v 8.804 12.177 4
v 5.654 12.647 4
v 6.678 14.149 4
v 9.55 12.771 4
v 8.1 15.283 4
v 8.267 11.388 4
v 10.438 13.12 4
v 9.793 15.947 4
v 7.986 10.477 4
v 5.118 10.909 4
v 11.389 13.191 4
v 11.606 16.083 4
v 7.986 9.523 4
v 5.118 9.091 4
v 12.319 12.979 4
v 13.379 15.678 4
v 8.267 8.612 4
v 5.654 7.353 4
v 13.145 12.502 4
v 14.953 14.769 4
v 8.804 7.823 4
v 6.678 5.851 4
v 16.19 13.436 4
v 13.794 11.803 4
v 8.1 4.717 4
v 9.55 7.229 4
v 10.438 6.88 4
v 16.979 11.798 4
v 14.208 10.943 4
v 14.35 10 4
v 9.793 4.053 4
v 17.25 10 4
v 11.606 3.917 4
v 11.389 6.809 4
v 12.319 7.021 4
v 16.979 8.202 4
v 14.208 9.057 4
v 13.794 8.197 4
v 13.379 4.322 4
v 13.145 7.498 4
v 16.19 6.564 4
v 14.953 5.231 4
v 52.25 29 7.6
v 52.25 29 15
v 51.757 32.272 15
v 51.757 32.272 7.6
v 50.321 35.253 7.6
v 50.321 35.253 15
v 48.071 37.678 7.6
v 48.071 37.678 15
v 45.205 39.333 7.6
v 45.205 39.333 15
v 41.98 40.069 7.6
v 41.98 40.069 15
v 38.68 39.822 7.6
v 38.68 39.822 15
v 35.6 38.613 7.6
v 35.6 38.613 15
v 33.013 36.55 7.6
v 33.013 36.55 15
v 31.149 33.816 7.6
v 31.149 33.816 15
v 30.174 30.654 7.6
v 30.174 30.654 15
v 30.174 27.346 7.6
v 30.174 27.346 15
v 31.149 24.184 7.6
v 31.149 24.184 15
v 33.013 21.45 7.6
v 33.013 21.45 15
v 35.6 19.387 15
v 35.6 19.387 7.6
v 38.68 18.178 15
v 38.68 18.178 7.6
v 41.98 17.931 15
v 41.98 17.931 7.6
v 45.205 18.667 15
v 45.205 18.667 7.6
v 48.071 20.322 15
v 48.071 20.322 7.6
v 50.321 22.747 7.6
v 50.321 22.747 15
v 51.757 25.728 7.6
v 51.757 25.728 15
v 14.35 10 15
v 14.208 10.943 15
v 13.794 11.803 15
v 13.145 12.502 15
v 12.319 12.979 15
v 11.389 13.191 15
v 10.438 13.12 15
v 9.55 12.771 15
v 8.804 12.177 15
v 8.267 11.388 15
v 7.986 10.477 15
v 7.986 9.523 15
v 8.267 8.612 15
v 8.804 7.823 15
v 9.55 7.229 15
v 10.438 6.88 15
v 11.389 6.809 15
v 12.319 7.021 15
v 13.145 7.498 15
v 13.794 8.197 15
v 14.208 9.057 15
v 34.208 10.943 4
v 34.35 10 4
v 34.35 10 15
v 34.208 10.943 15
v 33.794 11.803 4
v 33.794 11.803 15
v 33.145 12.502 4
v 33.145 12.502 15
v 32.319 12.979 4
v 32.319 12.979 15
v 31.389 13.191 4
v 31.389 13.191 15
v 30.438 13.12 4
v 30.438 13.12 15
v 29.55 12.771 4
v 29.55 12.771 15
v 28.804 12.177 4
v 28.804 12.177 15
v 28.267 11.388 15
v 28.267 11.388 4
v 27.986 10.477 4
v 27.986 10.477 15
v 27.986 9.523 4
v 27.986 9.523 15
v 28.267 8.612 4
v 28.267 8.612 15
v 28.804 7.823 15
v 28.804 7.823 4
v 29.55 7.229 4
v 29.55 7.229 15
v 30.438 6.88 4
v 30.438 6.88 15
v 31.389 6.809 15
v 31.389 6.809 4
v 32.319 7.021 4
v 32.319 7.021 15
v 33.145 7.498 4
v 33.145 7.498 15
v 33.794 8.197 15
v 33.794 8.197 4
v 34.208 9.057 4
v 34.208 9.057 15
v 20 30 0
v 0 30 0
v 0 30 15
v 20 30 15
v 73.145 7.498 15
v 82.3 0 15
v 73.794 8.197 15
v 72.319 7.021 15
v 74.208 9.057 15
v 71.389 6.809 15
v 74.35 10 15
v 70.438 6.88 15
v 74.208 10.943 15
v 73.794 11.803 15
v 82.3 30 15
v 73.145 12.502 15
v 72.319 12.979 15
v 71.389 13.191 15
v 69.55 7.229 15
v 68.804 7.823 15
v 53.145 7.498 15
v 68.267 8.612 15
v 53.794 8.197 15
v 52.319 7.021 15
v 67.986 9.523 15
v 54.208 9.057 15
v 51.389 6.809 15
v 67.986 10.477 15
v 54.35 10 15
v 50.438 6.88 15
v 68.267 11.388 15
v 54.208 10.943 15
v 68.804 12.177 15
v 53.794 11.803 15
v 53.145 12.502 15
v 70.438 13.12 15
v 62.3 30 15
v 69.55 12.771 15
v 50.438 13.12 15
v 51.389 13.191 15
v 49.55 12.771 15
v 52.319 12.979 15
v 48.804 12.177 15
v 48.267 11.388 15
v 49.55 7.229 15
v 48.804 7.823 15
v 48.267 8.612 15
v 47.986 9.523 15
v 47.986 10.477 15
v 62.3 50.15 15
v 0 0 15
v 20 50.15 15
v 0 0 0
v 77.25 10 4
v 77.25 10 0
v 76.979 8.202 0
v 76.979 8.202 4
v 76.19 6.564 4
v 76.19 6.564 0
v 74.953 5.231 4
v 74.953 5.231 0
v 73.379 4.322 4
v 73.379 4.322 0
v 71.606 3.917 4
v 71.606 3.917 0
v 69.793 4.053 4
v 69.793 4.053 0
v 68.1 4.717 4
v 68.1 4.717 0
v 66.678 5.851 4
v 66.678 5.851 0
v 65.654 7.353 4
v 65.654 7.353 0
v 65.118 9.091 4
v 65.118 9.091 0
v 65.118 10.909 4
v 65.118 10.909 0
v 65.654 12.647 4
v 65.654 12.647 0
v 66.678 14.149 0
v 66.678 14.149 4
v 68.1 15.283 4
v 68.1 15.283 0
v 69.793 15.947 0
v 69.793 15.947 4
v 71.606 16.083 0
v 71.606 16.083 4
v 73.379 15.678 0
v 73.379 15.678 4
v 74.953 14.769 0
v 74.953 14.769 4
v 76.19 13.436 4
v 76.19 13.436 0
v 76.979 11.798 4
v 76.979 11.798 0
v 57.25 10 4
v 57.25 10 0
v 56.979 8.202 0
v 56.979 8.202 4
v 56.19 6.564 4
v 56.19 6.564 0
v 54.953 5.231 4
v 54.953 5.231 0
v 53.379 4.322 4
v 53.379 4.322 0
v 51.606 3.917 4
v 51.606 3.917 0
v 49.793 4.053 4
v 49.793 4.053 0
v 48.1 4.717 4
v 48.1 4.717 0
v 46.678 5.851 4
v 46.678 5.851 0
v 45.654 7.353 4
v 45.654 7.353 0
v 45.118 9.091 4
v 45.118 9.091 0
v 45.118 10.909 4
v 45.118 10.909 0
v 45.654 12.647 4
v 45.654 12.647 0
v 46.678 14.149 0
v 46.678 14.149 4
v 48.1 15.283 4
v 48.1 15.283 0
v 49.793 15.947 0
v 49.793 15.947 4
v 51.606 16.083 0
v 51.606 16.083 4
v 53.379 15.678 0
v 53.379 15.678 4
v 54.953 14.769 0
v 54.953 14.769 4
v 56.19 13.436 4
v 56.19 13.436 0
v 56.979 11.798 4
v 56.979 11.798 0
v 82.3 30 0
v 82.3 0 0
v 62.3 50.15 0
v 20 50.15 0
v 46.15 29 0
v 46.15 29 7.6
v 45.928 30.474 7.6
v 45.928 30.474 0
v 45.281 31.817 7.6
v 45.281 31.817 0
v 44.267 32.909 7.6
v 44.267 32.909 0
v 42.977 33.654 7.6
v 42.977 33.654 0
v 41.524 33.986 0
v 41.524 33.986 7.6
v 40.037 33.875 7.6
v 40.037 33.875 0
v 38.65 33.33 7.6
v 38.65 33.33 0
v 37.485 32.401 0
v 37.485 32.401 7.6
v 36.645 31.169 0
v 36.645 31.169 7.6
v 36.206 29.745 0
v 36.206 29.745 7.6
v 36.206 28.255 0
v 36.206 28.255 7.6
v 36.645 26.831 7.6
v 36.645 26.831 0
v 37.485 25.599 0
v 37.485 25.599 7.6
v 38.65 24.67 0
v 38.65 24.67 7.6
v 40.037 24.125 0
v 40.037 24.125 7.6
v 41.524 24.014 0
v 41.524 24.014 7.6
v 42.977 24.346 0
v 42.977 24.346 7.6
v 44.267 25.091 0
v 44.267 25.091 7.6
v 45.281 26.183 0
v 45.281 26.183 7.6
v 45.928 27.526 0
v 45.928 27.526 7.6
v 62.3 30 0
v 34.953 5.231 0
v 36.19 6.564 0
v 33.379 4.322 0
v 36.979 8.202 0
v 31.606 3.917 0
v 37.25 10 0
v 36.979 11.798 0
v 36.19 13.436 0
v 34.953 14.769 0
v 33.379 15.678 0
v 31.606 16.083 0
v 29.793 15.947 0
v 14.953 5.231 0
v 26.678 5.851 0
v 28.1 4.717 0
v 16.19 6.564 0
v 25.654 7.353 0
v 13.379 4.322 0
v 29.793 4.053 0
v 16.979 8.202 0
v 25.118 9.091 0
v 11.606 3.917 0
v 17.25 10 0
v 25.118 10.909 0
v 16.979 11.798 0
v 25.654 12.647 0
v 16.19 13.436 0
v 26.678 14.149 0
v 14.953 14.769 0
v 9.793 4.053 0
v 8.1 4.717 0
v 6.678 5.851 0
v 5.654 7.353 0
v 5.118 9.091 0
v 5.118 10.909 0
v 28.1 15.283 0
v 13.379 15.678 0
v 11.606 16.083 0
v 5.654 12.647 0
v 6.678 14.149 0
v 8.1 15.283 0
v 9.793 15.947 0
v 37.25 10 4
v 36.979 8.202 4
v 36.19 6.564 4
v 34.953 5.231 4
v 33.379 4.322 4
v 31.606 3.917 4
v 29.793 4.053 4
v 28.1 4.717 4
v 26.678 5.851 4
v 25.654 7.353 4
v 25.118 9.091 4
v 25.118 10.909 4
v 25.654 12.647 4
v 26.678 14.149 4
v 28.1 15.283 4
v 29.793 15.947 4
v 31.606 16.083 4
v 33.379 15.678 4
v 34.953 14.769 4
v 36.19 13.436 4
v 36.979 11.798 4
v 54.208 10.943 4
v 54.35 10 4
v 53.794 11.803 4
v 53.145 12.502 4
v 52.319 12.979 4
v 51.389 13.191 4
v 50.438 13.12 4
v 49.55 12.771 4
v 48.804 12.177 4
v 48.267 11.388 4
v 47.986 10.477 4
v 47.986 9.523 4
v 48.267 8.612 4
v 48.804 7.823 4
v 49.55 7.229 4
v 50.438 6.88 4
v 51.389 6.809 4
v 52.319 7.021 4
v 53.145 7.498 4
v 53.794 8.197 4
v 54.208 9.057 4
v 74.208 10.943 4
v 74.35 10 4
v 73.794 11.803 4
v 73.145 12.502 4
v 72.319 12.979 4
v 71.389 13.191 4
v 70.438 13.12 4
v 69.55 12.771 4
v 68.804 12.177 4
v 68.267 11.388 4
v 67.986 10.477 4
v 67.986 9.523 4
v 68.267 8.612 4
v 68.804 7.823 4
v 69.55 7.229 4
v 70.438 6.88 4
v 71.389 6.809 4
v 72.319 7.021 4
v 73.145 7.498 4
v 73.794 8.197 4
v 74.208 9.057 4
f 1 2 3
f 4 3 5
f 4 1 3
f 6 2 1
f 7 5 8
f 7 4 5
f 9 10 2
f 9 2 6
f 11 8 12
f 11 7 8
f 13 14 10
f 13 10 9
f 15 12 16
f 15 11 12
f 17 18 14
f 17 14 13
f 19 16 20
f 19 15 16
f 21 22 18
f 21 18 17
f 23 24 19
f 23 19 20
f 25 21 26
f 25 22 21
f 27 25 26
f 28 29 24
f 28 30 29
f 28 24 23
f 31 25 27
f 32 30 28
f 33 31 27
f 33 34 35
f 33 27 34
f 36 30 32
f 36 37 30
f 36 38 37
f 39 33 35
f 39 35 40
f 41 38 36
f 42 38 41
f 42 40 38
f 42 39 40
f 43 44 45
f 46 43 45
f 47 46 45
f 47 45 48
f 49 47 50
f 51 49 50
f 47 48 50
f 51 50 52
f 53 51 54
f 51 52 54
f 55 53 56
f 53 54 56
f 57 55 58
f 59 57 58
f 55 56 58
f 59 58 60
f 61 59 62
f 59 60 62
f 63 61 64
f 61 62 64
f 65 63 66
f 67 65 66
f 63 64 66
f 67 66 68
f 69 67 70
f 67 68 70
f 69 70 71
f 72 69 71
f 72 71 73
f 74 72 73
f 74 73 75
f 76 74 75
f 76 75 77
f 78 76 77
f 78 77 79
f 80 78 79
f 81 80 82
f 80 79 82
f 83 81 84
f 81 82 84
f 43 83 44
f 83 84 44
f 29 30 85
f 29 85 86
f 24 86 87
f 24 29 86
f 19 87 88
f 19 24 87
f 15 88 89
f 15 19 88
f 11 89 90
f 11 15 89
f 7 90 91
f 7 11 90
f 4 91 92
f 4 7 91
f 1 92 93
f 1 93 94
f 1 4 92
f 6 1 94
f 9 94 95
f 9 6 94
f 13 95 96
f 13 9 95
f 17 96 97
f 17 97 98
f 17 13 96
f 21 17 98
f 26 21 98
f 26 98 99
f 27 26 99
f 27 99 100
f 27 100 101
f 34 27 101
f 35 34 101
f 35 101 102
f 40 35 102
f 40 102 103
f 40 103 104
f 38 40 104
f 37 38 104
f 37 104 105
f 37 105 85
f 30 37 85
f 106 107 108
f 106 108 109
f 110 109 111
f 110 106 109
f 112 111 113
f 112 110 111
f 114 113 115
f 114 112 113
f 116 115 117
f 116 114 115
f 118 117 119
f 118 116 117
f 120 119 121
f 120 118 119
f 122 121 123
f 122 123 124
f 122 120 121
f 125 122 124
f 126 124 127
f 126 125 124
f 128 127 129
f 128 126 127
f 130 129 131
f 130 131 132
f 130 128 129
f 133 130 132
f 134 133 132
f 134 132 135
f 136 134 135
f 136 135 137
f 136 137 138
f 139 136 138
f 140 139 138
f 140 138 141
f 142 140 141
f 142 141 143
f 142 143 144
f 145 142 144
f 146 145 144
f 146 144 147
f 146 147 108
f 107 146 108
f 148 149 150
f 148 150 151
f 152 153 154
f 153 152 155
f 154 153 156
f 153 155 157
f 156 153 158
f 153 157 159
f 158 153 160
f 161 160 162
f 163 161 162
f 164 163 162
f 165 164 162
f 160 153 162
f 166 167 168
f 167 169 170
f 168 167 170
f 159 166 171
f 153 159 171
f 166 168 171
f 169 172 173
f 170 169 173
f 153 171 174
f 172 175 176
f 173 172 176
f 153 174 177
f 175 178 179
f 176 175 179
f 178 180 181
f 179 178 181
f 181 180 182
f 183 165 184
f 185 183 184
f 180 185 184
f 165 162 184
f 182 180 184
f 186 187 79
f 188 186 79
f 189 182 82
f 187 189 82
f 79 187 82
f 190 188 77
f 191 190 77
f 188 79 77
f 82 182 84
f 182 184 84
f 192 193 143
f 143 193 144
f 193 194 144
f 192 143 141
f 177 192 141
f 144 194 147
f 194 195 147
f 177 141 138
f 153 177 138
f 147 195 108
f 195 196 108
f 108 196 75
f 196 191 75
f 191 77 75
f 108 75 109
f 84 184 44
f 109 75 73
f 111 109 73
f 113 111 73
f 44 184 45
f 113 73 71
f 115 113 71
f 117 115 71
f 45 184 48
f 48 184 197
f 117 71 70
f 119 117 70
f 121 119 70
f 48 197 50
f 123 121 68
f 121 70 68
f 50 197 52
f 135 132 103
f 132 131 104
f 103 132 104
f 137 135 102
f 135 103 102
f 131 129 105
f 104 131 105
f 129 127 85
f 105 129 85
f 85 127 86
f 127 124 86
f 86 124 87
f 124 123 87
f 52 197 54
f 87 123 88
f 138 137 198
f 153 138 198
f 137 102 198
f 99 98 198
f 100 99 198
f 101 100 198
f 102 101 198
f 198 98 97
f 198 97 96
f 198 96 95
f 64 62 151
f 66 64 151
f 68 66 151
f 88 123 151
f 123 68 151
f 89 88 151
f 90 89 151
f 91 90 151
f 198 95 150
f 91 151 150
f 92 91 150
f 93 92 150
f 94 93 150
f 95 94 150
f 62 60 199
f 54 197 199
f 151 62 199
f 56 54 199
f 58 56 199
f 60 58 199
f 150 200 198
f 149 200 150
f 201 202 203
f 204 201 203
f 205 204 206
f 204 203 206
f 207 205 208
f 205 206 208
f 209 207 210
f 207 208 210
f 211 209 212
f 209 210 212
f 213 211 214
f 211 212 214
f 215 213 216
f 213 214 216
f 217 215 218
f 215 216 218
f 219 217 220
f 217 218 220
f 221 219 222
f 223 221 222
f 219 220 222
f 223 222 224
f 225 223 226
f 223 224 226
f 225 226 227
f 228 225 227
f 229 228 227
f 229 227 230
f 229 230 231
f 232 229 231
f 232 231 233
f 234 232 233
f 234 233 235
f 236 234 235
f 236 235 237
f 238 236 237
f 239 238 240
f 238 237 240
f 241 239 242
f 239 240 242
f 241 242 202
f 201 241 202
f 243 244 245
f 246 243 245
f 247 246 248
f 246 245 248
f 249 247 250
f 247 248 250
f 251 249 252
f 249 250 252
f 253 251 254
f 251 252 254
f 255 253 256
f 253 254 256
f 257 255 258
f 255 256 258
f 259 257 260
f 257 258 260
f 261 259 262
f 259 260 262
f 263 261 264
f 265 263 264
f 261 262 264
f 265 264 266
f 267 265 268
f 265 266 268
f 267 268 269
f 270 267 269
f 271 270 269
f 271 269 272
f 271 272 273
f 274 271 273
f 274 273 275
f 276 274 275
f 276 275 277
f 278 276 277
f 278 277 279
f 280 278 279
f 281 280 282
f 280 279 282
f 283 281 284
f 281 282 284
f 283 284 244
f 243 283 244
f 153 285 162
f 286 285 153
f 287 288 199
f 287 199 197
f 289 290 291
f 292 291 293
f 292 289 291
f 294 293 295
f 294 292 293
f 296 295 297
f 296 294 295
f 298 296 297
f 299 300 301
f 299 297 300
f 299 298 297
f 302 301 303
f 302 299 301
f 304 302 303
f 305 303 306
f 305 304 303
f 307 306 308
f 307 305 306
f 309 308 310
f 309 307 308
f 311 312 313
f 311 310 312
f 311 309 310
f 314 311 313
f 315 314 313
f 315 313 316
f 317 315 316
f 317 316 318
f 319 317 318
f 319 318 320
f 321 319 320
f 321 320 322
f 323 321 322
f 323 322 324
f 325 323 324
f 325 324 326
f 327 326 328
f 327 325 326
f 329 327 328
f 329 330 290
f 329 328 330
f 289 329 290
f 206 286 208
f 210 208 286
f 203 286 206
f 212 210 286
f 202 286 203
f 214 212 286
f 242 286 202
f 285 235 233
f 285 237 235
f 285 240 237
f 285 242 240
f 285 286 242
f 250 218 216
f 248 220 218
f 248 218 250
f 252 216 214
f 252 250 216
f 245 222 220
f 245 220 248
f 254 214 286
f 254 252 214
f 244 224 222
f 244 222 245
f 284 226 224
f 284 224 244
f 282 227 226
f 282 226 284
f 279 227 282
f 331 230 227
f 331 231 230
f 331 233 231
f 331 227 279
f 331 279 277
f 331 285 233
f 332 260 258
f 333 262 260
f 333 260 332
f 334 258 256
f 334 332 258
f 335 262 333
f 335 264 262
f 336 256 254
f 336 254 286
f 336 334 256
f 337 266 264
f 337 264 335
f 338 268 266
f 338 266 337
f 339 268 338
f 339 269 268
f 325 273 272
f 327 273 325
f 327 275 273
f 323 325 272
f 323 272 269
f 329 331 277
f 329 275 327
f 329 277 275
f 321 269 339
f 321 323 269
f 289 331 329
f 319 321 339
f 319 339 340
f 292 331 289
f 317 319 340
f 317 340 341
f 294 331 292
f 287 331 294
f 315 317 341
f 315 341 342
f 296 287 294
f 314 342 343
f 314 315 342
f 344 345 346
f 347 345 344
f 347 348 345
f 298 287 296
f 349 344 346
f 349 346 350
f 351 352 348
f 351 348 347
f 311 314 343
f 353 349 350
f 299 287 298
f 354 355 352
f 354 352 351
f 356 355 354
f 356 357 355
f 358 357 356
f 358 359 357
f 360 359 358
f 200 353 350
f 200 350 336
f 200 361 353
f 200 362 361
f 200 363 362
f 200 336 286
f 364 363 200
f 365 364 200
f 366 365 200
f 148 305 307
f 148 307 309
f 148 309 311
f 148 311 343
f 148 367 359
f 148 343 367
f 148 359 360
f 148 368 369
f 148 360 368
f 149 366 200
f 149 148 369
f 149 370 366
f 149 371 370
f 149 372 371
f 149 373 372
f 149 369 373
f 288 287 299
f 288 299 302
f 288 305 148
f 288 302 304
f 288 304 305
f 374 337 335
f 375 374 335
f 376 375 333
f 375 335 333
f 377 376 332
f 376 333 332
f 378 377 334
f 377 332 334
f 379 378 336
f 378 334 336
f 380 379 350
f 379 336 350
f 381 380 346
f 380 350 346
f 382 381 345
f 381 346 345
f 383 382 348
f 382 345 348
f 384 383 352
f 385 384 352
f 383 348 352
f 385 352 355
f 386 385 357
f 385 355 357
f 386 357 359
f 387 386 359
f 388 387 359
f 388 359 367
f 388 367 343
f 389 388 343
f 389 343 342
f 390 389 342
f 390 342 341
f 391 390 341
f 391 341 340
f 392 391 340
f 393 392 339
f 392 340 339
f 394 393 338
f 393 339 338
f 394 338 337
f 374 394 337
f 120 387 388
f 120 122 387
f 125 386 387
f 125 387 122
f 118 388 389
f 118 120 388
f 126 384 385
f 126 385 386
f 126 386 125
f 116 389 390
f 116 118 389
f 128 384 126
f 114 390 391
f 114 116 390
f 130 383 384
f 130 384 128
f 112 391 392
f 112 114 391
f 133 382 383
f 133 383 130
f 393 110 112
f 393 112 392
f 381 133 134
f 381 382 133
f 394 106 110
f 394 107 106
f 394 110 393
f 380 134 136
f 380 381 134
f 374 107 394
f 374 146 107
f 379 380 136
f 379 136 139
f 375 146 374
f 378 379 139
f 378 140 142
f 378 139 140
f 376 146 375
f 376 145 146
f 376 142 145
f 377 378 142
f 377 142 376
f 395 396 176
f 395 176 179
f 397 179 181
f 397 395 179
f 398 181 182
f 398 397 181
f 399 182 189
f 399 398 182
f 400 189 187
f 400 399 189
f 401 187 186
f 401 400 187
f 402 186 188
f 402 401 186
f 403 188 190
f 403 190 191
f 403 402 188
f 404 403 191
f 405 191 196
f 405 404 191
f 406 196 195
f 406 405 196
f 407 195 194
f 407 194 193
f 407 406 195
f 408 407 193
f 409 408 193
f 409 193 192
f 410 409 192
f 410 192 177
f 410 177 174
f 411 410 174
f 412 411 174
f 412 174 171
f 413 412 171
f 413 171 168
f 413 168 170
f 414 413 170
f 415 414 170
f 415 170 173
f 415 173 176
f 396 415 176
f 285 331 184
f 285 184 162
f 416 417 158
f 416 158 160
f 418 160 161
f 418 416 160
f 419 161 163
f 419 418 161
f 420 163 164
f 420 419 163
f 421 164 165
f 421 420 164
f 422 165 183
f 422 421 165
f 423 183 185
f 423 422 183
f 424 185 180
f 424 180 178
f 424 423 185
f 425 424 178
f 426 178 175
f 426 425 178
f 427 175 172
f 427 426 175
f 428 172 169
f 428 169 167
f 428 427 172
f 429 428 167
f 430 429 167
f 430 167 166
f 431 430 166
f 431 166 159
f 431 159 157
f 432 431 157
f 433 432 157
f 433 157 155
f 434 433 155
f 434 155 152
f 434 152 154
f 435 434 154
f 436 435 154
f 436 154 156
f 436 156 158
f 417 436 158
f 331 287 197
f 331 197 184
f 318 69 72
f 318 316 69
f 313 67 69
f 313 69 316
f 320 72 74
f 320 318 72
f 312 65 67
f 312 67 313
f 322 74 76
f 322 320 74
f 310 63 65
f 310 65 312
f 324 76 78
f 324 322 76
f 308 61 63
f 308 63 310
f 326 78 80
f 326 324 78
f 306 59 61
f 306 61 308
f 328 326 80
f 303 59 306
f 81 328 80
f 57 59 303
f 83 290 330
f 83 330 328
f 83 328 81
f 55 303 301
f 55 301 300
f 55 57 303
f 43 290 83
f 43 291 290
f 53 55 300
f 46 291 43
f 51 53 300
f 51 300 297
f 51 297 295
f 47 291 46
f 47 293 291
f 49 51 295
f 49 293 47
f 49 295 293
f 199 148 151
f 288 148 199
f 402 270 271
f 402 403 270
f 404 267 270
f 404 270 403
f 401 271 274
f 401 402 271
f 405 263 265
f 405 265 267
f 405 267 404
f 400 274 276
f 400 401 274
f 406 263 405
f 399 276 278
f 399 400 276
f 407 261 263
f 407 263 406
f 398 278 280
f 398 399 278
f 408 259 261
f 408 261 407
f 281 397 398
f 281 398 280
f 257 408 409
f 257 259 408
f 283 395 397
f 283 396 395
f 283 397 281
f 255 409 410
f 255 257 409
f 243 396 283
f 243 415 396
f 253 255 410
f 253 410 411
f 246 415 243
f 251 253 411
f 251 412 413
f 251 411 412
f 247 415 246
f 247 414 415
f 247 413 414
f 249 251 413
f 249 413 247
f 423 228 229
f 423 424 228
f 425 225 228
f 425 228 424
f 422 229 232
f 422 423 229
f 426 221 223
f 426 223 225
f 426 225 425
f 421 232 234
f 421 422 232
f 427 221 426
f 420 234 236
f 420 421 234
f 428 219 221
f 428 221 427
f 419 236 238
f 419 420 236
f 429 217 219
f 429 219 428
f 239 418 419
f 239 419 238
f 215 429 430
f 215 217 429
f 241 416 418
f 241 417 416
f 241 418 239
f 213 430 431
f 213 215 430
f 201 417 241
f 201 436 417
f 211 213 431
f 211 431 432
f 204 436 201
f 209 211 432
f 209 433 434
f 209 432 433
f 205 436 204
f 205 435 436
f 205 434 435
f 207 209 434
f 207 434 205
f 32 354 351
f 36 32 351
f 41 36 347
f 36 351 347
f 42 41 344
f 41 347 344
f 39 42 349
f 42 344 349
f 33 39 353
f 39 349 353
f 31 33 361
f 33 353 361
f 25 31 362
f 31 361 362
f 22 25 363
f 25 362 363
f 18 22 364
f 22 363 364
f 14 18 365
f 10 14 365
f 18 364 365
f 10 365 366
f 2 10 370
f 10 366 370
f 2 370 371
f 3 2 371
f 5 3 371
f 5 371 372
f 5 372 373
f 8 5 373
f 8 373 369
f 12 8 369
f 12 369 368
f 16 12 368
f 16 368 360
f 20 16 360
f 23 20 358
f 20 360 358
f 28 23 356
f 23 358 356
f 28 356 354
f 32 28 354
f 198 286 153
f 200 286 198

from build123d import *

# Parameters (mm, degrees)
SKETCH_R        = 5
SKETCH_R_2      = 3.2
PAD_DEPTH       = 15
SKETCH002_R     = 6.1
POCKET001_DEPTH = 4
SKETCH003_R     = 11.1
POCKET_DEPTH    = 7.4


with BuildPart() as part:
    # Sketch → Pad (new body)
    with BuildSketch(Plane.XY):
        Polygon((20, 30), (20, 50.15), (62.3, 50.15), (62.3, 30), (82.3, 30), (82.3, 0), (0, 0), (0, 30), align=None)
        with Locations((41.15, 29)):
            Circle(SKETCH_R, mode=Mode.SUBTRACT)
        with Locations((11.15, 10)):
            Circle(SKETCH_R_2, mode=Mode.SUBTRACT)
        with Locations((31.15, 10)):
            Circle(SKETCH_R_2, mode=Mode.SUBTRACT)
        with Locations((51.15, 10)):
            Circle(SKETCH_R_2, mode=Mode.SUBTRACT)
        with Locations((71.15, 10)):
            Circle(SKETCH_R_2, mode=Mode.SUBTRACT)
    extrude(amount=PAD_DEPTH)

    # Sketch002 → Pocket001 (cut)
    with BuildSketch(Plane(origin=(0, 0, 0), x_dir=(1, 0, 0), z_dir=(0, 0, -1))):
        with Locations((11.15, -10)):
            Circle(SKETCH002_R)
        with Locations((31.15, -10)):
            Circle(SKETCH002_R)
        with Locations((51.15, -10)):
            Circle(SKETCH002_R)
        with Locations((71.15, -10)):
            Circle(SKETCH002_R)
    extrude(amount=-POCKET001_DEPTH, mode=Mode.SUBTRACT)

    # Sketch003 (on Face5 of Pocket001) → Pocket (cut)
    with BuildSketch(Plane.XY.offset(15)):
        with Locations((41.15, 29)):
            Circle(SKETCH003_R)
    extrude(amount=-POCKET_DEPTH, mode=Mode.SUBTRACT)


solid = part.part
